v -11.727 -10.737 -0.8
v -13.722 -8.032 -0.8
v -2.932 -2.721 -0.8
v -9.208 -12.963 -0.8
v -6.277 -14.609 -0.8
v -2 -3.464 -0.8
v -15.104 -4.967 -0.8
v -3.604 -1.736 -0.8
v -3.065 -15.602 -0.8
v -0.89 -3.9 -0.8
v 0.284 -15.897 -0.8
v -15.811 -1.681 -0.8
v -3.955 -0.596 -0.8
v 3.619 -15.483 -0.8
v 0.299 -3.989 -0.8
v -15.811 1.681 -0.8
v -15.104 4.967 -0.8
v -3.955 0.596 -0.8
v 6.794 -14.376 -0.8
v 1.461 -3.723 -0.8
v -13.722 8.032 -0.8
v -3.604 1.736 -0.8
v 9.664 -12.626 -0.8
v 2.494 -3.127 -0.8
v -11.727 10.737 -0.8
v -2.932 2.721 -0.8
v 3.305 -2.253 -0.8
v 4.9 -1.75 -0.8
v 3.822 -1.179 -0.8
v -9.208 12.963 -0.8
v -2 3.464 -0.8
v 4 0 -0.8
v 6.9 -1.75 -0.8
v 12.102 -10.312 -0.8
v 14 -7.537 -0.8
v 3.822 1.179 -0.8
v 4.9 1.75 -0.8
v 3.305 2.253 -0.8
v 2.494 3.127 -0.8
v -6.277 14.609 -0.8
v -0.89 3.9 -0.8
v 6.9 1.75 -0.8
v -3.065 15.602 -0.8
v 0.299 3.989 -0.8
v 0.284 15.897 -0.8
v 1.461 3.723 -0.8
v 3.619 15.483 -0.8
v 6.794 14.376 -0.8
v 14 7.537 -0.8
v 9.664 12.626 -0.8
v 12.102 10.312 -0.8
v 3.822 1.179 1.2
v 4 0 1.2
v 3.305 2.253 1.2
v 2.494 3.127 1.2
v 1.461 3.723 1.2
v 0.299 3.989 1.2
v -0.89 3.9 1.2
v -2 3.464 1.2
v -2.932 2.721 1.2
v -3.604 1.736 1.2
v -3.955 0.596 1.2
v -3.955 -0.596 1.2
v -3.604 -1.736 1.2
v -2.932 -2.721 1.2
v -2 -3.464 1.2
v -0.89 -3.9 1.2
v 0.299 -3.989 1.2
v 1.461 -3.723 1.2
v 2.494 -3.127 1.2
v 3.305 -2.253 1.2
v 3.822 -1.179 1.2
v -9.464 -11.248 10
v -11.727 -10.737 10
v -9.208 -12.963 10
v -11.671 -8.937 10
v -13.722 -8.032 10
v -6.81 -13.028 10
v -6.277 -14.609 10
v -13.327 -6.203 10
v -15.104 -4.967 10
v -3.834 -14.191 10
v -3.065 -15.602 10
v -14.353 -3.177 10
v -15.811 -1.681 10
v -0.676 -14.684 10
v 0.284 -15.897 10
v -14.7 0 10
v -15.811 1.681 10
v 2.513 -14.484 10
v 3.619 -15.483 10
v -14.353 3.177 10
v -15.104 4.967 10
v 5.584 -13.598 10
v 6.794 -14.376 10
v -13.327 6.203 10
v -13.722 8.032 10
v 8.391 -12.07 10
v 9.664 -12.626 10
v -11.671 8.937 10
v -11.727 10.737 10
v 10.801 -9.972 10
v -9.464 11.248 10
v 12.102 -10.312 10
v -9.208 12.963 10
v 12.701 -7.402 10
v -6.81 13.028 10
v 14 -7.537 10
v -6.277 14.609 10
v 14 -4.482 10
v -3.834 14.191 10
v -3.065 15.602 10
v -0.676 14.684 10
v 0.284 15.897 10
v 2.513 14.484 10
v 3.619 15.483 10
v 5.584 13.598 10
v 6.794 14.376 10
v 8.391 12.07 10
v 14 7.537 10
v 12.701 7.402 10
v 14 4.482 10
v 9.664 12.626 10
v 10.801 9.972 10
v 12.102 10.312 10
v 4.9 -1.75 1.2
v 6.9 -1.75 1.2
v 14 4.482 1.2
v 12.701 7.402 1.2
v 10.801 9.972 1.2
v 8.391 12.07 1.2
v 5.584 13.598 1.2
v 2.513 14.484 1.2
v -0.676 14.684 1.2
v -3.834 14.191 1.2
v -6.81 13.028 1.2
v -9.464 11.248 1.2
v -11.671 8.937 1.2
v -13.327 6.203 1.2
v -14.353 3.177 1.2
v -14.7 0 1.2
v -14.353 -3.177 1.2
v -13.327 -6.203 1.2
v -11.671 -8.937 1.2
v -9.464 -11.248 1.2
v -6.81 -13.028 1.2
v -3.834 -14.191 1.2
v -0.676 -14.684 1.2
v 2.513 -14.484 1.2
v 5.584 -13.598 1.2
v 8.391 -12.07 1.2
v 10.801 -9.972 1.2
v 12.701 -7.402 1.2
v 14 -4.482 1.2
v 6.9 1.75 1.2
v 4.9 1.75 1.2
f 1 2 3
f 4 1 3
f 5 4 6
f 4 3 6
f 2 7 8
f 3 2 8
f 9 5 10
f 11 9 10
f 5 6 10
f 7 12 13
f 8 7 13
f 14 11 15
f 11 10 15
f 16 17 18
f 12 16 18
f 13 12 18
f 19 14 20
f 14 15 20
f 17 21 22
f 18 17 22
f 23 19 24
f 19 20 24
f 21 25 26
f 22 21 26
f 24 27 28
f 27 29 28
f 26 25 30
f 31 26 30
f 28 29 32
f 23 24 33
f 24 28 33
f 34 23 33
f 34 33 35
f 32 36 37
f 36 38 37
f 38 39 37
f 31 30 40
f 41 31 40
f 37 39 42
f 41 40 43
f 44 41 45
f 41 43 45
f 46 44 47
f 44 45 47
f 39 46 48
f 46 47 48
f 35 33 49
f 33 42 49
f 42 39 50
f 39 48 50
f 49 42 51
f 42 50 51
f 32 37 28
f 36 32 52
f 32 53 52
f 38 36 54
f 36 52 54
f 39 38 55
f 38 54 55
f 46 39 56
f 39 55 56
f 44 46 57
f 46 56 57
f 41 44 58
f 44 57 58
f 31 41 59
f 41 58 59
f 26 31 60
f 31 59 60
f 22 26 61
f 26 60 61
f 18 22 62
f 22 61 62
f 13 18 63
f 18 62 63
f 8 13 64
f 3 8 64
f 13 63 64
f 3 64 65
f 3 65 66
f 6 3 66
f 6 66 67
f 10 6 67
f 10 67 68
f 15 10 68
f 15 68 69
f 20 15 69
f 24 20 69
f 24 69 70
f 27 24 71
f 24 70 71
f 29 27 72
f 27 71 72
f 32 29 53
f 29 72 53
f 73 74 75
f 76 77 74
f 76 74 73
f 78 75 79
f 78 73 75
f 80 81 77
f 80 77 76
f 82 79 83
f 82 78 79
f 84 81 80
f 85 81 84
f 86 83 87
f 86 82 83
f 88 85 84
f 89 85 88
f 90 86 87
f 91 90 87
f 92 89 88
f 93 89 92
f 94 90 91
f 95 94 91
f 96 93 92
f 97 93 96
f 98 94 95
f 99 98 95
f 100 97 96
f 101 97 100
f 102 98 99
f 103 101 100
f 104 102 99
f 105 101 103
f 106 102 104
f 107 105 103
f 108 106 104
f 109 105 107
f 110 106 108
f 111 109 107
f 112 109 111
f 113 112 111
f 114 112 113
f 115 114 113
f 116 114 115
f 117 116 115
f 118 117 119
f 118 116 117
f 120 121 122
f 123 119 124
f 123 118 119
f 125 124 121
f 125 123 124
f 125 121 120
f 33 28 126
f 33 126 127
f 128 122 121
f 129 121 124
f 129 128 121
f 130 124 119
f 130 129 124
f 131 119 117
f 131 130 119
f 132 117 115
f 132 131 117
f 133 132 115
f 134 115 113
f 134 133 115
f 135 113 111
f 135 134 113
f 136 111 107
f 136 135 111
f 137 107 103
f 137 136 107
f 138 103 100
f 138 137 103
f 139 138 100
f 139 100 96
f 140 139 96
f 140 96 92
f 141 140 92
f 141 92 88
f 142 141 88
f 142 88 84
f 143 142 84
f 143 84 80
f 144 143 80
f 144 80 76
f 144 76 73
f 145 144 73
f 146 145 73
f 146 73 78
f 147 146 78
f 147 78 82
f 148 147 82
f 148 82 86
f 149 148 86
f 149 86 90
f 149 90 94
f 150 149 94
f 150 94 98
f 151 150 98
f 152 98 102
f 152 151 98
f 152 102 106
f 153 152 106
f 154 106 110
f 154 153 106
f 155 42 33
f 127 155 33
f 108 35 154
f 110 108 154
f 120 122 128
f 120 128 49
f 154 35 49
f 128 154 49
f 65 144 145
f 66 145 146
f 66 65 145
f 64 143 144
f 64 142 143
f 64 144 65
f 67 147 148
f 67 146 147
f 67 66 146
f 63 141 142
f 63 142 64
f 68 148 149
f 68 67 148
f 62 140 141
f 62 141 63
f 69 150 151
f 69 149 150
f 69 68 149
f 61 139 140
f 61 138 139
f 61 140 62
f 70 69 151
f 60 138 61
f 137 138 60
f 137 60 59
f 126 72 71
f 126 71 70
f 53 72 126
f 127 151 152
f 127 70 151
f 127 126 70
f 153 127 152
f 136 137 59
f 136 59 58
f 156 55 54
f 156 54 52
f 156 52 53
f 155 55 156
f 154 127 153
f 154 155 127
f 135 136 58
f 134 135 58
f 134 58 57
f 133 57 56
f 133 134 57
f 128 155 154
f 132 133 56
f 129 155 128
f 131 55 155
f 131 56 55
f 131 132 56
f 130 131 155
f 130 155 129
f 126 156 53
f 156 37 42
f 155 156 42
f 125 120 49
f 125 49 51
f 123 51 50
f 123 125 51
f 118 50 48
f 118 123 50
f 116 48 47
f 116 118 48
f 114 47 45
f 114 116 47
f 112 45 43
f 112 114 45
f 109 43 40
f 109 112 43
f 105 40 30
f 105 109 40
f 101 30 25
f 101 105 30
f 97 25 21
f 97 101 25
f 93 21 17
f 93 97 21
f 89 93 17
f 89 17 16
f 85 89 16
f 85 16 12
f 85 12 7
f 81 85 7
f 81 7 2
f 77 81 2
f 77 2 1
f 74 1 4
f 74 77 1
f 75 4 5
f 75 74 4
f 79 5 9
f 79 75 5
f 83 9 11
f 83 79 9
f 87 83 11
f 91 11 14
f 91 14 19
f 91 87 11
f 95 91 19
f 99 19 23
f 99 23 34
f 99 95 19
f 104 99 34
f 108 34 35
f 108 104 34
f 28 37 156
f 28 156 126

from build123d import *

# Parameters (mm, degrees)
F0_R     = 15.9
F0_R_2   = 4
F1_DEPTH = 10
F2_T     = -1.2
F3_DEPTH = 10.001
F4_DEPTH = 0.8
F5_W     = 2
F5_H     = 3.5
F6_DEPTH = 10.801


# Not quite as in the source:
# - a feature names something its author has since deleted; it is built from what else it names


with BuildPart() as f1:
    # F0 (on Top) → F1 (new body)
    with BuildSketch(Plane.XY):
        Circle(F0_R)
        Circle(F0_R_2, mode=Mode.SUBTRACT)
        Circle(F0_R_2)
    extrude(amount=F1_DEPTH)

    # F2
    f2_openings = [f1.faces().sort_by_distance(p)[0] for p in [
        (0, 0, 10),
    ]]
    offset(amount=F2_T, openings=f2_openings)

    # F0 (on Top) → F3 (cut, through all)
    with BuildSketch(Plane.XY):
        Circle(F0_R_2)
    extrude(amount=F3_DEPTH, mode=Mode.SUBTRACT)

    # F0 (on Top) → F4 (join)
    with BuildSketch(Plane.XY):
        Circle(F0_R)
        Circle(F0_R_2, mode=Mode.SUBTRACT)
    extrude(amount=-F4_DEPTH)

    # F5 (on face) → F6 (cut, through all)
    with BuildSketch(Plane(origin=(0, 0, -0.8), x_dir=(1, 0, 0), z_dir=(0, 0, -1))):
        with Locations((5.9, 0)):
            Rectangle(F5_W, F5_H)
        with BuildLine():
            ThreePointArc((15.9, 0), (15.4176846511, 3.8865151486), (14, 7.5372408745))
            Line((14, 7.5372408745), (14, -7.5372408745))
            ThreePointArc((14, -7.5372408745), (15.4176846511, -3.8865151486), (15.9, 0))
        make_face()
    extrude(amount=-F6_DEPTH, mode=Mode.SUBTRACT)


solid = f1.part
